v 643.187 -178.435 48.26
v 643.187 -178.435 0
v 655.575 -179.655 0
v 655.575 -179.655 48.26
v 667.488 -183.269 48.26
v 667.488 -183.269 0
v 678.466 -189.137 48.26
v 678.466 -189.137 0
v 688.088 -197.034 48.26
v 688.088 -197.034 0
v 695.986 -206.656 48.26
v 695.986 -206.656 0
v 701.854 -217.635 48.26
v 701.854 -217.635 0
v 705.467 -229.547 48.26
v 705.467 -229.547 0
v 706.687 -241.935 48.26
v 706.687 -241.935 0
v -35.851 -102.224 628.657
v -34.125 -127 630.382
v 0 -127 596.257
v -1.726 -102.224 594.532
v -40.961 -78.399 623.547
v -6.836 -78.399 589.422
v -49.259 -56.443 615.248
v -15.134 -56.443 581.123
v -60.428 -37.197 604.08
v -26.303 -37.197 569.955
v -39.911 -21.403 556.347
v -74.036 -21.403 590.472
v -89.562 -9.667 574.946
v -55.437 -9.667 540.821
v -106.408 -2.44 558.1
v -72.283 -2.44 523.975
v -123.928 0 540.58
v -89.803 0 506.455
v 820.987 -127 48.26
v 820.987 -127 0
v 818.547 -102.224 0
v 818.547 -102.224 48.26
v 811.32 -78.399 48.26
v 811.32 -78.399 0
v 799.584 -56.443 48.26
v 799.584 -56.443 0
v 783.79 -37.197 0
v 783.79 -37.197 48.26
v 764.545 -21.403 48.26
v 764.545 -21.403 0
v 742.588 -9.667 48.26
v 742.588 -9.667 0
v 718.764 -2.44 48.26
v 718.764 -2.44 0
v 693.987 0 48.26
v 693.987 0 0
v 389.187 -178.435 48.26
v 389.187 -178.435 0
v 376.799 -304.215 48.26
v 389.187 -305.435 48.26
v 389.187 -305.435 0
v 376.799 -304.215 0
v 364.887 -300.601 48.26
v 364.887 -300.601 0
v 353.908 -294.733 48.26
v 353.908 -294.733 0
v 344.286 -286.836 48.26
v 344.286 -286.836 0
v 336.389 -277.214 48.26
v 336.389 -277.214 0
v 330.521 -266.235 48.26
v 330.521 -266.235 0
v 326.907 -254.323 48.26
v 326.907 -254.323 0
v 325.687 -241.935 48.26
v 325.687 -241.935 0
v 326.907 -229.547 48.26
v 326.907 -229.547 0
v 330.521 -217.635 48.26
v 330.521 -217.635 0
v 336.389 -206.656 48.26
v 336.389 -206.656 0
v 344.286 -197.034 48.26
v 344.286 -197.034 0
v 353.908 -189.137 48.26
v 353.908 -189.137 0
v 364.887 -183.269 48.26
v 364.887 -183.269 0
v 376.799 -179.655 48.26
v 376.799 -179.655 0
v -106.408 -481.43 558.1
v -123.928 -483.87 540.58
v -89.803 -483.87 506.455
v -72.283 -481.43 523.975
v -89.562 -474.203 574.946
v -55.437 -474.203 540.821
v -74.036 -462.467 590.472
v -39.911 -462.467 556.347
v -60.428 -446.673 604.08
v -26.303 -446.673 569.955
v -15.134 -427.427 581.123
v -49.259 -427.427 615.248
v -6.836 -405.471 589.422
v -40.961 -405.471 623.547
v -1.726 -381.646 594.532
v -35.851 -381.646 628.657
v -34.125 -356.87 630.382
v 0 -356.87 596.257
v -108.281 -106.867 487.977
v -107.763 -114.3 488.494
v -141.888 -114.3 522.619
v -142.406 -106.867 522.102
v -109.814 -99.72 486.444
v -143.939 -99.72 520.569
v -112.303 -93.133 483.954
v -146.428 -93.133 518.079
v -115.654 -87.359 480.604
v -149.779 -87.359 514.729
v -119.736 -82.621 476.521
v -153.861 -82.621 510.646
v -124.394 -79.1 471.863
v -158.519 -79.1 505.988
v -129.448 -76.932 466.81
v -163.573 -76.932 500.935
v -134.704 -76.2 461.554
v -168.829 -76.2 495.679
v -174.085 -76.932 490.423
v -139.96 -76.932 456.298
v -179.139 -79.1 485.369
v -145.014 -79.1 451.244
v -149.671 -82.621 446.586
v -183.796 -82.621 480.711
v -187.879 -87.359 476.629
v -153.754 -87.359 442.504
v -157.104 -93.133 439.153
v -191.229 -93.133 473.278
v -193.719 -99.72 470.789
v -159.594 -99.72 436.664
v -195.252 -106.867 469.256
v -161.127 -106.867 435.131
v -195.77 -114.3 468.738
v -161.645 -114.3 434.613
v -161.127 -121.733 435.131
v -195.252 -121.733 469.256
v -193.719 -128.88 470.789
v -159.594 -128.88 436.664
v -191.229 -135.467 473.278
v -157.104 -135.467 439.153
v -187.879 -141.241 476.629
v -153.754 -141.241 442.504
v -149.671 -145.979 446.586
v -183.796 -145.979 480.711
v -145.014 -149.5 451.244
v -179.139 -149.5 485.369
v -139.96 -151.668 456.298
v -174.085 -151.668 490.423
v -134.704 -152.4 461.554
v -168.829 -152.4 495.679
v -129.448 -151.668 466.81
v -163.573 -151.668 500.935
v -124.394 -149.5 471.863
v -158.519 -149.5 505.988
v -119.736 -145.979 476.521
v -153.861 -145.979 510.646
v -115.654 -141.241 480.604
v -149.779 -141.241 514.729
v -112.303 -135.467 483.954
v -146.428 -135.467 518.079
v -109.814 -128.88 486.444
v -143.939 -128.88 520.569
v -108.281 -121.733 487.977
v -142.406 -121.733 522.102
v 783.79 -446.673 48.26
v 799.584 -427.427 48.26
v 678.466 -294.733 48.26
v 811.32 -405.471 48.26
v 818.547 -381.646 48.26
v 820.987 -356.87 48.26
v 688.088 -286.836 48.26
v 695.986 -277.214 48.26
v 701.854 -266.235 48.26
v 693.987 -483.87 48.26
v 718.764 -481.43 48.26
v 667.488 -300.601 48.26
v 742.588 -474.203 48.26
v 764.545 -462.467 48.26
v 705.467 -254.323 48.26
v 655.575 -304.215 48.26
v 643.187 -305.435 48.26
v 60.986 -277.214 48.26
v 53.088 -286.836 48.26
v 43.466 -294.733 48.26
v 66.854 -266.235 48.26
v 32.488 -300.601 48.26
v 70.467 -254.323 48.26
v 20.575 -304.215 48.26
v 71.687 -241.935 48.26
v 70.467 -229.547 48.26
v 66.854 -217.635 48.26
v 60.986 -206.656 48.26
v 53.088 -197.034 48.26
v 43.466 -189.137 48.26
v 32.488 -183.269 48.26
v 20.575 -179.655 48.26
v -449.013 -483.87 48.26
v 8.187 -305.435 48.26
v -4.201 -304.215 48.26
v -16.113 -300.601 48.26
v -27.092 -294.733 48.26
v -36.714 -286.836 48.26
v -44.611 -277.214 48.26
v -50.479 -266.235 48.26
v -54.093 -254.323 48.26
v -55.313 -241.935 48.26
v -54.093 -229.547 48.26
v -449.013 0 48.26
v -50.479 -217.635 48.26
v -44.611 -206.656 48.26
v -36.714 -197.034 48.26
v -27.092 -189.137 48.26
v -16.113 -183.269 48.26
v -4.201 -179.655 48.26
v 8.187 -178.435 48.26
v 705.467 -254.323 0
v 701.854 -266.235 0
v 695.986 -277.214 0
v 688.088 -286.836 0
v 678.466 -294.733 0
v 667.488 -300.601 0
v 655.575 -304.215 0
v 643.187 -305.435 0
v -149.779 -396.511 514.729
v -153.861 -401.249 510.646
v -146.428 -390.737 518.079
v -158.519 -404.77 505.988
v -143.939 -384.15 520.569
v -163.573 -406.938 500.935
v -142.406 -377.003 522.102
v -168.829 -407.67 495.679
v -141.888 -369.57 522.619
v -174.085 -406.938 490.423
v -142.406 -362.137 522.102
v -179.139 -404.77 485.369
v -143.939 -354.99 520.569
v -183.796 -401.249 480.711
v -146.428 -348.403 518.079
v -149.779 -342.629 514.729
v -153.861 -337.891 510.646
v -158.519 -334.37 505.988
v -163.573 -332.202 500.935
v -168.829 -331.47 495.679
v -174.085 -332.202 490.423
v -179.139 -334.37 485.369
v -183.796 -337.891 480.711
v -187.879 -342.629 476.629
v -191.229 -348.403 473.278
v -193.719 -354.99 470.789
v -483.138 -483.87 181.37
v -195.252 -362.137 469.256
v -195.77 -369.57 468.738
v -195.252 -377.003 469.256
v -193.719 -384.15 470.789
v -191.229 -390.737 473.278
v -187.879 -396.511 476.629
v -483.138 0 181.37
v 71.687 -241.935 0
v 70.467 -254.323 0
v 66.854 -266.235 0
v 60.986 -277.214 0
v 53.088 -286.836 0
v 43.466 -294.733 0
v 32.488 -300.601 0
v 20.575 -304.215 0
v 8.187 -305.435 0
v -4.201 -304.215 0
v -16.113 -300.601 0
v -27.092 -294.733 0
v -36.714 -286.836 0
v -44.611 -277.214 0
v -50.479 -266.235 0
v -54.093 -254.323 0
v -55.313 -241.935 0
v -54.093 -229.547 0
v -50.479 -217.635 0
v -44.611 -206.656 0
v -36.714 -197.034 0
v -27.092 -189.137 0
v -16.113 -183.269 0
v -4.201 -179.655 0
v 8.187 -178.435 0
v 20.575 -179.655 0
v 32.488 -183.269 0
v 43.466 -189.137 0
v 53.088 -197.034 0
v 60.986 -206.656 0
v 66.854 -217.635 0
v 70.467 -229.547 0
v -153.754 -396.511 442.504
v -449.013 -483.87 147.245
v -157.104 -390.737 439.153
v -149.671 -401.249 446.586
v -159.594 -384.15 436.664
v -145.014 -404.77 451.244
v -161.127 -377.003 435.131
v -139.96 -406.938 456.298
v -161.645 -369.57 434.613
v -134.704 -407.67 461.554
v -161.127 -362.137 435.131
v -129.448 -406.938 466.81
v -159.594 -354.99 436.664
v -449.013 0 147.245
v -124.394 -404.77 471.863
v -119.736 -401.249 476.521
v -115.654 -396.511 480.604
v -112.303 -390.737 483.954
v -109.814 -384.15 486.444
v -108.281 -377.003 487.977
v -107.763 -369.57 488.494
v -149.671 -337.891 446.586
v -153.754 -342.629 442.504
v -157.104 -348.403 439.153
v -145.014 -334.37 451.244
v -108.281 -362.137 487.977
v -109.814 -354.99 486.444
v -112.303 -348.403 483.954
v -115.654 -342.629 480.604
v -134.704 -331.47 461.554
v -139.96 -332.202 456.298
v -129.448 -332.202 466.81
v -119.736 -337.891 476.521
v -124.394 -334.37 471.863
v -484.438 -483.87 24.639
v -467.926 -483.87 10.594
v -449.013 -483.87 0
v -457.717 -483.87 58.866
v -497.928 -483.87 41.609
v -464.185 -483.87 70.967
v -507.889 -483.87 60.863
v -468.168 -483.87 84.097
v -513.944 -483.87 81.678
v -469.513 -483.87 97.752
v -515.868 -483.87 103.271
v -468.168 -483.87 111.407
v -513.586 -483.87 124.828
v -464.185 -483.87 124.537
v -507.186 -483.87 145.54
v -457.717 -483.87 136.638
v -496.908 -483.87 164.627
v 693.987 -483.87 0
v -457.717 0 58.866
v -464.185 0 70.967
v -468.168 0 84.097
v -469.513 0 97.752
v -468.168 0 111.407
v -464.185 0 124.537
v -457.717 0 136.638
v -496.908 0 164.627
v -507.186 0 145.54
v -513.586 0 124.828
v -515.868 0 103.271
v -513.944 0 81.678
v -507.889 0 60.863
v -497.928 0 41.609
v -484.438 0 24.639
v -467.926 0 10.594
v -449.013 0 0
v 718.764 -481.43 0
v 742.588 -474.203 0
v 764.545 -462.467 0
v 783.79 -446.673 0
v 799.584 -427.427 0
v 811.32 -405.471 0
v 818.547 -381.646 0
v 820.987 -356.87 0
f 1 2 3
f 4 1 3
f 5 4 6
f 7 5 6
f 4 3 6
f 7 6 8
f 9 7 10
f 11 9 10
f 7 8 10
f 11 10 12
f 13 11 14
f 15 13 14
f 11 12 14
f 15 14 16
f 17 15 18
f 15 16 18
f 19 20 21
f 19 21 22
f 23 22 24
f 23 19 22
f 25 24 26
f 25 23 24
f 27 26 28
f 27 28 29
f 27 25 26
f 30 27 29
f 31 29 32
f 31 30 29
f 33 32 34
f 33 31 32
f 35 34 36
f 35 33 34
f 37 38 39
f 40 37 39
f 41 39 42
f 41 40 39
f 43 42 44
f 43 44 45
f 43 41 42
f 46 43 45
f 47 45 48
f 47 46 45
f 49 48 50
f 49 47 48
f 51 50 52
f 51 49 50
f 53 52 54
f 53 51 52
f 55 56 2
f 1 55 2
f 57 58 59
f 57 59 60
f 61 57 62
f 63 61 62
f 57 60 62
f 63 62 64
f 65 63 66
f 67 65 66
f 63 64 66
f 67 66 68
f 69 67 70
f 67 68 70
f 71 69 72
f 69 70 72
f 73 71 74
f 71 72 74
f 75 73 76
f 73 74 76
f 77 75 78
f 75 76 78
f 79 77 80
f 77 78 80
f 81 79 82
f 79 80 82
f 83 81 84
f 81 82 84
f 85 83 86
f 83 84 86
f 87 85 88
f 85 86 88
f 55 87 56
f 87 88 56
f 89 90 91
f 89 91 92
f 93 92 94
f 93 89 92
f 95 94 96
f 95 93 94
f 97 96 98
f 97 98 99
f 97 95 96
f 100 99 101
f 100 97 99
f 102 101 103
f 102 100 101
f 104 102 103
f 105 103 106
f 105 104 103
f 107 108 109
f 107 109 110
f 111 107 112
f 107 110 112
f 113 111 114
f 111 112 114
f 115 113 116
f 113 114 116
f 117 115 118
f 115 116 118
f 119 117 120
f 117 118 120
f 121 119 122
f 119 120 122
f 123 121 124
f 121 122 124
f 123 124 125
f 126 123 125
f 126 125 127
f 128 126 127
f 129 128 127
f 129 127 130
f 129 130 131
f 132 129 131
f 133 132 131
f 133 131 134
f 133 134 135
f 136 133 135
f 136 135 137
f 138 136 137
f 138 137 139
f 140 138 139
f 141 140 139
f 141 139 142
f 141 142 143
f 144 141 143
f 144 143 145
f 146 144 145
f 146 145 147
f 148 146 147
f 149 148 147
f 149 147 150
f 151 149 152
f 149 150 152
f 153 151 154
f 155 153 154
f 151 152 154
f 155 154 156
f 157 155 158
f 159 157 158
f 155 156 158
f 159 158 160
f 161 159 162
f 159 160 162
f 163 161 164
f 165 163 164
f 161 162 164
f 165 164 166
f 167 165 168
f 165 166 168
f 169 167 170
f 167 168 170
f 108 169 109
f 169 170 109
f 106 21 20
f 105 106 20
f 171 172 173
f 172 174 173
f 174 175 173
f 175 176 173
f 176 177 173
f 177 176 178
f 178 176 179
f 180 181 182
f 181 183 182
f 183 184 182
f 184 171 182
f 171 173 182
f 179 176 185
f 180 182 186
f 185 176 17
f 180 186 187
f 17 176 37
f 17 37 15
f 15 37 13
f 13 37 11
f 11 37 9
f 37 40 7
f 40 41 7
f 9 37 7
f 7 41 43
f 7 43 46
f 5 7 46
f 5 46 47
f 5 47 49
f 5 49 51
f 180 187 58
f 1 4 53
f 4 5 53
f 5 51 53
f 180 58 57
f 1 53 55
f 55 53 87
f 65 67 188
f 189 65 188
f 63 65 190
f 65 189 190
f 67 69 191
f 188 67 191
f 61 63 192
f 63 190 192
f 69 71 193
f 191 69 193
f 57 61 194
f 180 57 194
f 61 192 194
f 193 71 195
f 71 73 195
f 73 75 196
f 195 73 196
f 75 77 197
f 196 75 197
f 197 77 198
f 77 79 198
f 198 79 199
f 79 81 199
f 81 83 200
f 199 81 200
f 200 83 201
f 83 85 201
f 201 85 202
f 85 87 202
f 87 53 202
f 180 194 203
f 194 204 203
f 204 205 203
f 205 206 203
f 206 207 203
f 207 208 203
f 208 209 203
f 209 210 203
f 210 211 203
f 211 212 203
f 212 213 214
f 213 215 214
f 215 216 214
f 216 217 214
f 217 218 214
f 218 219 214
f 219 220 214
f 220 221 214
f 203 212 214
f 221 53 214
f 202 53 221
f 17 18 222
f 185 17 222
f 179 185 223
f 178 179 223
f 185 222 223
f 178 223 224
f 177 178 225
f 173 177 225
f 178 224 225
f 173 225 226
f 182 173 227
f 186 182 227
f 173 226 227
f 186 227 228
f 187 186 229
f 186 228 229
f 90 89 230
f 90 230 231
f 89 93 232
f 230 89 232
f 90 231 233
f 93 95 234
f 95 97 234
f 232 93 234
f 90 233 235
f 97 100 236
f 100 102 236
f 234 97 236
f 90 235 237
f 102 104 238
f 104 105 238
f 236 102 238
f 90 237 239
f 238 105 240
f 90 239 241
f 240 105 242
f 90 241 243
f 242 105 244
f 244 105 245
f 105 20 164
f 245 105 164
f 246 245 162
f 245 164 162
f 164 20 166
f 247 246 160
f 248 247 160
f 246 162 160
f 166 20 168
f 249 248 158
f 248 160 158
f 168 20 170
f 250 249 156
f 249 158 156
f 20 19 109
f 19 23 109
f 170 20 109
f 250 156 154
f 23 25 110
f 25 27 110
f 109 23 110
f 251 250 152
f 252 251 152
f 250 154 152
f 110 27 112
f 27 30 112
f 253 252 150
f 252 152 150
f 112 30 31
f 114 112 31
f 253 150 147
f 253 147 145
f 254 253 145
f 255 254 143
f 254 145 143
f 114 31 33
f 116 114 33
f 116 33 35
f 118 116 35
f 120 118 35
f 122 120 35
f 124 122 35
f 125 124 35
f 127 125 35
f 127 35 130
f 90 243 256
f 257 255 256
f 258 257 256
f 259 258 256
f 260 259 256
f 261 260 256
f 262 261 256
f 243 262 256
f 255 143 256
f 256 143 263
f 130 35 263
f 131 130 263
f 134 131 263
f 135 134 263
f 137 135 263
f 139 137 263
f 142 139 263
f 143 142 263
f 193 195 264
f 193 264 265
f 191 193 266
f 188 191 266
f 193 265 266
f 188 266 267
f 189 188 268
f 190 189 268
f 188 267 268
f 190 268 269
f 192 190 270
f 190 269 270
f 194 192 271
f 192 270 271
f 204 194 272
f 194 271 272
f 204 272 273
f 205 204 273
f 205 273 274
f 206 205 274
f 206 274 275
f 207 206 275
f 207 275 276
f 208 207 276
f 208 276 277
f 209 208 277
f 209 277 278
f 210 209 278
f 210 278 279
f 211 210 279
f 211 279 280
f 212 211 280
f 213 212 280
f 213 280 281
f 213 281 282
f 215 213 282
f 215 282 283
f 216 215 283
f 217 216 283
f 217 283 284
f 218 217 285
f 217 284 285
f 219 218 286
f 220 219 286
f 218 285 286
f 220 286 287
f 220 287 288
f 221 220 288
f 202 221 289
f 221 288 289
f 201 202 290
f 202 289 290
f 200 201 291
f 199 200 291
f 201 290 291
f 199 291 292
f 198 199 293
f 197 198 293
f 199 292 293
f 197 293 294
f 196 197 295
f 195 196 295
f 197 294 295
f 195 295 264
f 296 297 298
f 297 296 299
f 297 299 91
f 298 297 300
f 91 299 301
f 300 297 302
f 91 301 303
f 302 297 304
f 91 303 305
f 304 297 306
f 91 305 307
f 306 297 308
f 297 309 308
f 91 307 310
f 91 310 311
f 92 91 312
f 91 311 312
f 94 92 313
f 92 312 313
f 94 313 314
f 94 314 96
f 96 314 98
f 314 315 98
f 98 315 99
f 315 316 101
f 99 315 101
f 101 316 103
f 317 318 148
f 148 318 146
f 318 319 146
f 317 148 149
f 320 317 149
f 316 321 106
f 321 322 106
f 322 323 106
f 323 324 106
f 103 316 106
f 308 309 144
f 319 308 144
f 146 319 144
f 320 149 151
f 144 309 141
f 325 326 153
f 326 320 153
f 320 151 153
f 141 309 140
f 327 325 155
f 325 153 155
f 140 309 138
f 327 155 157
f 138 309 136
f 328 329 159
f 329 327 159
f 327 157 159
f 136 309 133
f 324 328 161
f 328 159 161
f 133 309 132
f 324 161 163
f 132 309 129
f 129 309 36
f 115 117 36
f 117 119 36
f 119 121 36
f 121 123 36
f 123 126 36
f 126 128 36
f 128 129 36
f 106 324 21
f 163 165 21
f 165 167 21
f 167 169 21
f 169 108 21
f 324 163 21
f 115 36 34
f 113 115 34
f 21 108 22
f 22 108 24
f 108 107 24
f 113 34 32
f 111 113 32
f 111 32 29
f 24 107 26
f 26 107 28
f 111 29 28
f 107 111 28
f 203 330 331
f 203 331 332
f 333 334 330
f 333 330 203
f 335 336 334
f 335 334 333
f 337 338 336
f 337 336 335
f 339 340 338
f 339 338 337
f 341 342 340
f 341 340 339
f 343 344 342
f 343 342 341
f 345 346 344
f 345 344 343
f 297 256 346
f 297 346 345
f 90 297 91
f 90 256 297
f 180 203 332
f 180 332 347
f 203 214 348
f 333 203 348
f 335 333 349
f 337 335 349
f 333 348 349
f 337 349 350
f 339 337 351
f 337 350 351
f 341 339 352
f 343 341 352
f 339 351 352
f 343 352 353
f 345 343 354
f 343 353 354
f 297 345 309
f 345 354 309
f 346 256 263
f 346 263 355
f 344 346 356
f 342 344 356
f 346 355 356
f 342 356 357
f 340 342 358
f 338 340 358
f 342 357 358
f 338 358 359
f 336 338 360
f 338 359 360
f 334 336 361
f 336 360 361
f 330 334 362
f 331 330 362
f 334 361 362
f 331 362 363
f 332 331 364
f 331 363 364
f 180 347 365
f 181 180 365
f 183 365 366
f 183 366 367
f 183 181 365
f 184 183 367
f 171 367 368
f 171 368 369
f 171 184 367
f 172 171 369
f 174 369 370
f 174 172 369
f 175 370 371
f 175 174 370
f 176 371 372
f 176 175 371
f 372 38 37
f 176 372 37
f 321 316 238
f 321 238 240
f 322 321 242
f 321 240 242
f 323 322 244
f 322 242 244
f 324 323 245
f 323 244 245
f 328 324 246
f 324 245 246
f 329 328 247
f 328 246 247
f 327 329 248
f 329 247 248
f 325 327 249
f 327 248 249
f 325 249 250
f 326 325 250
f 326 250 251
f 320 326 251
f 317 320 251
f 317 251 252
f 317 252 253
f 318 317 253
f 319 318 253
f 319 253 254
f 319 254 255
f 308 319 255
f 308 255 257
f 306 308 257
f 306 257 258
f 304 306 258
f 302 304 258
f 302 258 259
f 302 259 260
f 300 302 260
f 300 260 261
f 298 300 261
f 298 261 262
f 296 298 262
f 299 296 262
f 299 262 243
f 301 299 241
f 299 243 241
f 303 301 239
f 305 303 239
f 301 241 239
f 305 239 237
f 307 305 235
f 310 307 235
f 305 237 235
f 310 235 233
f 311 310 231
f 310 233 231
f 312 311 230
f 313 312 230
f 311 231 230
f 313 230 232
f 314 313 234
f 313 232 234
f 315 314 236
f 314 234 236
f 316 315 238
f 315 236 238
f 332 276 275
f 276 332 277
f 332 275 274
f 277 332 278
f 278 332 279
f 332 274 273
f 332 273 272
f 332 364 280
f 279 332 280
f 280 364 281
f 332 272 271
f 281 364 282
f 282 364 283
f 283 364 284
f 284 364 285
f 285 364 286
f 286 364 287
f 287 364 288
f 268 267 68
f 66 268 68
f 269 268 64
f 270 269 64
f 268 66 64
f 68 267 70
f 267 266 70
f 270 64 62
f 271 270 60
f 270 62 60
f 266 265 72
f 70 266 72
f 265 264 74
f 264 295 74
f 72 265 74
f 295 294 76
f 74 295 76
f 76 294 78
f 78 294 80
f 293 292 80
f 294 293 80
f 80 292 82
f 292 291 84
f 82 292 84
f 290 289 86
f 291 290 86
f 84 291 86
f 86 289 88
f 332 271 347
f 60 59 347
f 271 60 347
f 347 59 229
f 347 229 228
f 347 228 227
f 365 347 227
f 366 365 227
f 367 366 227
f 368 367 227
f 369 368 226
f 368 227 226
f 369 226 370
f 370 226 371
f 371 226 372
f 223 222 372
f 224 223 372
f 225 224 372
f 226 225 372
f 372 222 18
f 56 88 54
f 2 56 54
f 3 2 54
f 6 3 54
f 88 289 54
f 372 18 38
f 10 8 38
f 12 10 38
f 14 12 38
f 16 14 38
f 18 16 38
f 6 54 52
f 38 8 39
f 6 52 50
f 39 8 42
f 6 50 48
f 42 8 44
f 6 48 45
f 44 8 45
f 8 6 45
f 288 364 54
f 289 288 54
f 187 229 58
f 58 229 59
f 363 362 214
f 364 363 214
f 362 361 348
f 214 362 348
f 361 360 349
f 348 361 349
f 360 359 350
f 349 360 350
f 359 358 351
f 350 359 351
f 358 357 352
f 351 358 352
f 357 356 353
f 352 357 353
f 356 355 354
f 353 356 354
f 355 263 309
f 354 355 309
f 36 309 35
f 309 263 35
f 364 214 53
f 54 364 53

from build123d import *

# Parameters (mm, degrees)
F1_DEPTH = 483.87
F2_R     = 63.5
F3_DEPTH = 142.24
F4_R     = 38.1
F5_DEPTH = 73.66
F6_R     = 127
F7_R     = 127
F8_R     = 127
F9_R     = 127


with BuildPart() as f1:
    # F0 (on Front) → F1 (new body)
    with BuildSketch(Plane.XZ):
        with BuildLine():
            ThreePointArc((-483.137783, 181.369661), (-513.944341, 81.678197), (-449.012806, 0))
            Line((-449.012806, 0), (820.987194, 0))
            Line((820.987194, 0), (820.987194, 48.26))
            Line((820.987194, 48.26), (-449.012806, 48.26))
            ThreePointArc((-449.012806, 48.26), (-469.513207, 97.752345), (-449.012806, 147.244691))
            Line((-449.012806, 147.244691), (0, 596.257497))
            Line((0, 596.257497), (-34.124973, 630.38247))
            Line((-34.124973, 630.38247), (-483.137783, 181.369661))
        make_face()
    extrude(amount=F1_DEPTH)

    # F2 (on face) → F3 (cut)
    with BuildSketch(Plane(origin=(0, 0, 0), x_dir=(1, 0, 0), z_dir=(0, 0, -1))):
        with Locations((8.187194, 241.935)):
            Circle(F2_R)
        with BuildLine():
            ThreePointArc((389.187194, 178.435), (434.088475, 197.033719), (452.687194, 241.935))
            ThreePointArc((452.687194, 241.935), (434.088475, 286.836281), (389.187194, 305.435))
            ThreePointArc((389.187194, 305.435), (325.687194, 241.935), (389.187194, 178.435))
        make_face()
        with BuildLine():
            ThreePointArc((389.187194, 305.435), (434.088475, 286.836281), (452.687194, 241.935))
            ThreePointArc((452.687194, 241.935), (434.088475, 197.033719), (389.187194, 178.435))
            Line((389.187194, 178.435), (643.187194, 178.435))
            ThreePointArc((643.187194, 178.435), (579.687194, 241.935), (643.187194, 305.435))
            Line((643.187194, 305.435), (389.187194, 305.435))
        make_face()
        with BuildLine():
            ThreePointArc((706.687194, 241.935), (688.088475, 286.836281), (643.187194, 305.435))
            ThreePointArc((643.187194, 305.435), (579.687194, 241.935), (643.187194, 178.435))
            ThreePointArc((643.187194, 178.435), (688.088475, 197.033719), (706.687194, 241.935))
        make_face()
    extrude(amount=-F3_DEPTH, mode=Mode.SUBTRACT)

    # F4 (on face) → F5 (cut)
    with BuildSketch(Plane(origin=(-332.253722, 0, 332.253722), x_dir=(0.707107, 0, 0.707107), z_dir=(-0.707107, 0, 0.707107))):
        with Locations((231.117719, -114.3)):
            Circle(F4_R)
        with Locations((231.117719, -369.57)):
            Circle(F4_R)
    extrude(amount=-F5_DEPTH, mode=Mode.SUBTRACT)

    # F6
    f6_edges = [f1.edges().sort_by_distance(p)[0] for p in [
        (-17.062487, -483.87, 613.319983),
    ]]
    fillet(f6_edges, radius=F6_R)

    # F7
    f7_edges = [f1.edges().sort_by_distance(p)[0] for p in [
        (-17.062487, 0, 613.319983),
    ]]
    fillet(f7_edges, radius=F7_R)

    # F8
    f8_edges = [f1.edges().sort_by_distance(p)[0] for p in [
        (820.987194, -483.87, 24.13),
    ]]
    fillet(f8_edges, radius=F8_R)

    # F9
    f9_edges = [f1.edges().sort_by_distance(p)[0] for p in [
        (820.987194, 0, 24.13),
    ]]
    fillet(f9_edges, radius=F9_R)


solid = f1.part
